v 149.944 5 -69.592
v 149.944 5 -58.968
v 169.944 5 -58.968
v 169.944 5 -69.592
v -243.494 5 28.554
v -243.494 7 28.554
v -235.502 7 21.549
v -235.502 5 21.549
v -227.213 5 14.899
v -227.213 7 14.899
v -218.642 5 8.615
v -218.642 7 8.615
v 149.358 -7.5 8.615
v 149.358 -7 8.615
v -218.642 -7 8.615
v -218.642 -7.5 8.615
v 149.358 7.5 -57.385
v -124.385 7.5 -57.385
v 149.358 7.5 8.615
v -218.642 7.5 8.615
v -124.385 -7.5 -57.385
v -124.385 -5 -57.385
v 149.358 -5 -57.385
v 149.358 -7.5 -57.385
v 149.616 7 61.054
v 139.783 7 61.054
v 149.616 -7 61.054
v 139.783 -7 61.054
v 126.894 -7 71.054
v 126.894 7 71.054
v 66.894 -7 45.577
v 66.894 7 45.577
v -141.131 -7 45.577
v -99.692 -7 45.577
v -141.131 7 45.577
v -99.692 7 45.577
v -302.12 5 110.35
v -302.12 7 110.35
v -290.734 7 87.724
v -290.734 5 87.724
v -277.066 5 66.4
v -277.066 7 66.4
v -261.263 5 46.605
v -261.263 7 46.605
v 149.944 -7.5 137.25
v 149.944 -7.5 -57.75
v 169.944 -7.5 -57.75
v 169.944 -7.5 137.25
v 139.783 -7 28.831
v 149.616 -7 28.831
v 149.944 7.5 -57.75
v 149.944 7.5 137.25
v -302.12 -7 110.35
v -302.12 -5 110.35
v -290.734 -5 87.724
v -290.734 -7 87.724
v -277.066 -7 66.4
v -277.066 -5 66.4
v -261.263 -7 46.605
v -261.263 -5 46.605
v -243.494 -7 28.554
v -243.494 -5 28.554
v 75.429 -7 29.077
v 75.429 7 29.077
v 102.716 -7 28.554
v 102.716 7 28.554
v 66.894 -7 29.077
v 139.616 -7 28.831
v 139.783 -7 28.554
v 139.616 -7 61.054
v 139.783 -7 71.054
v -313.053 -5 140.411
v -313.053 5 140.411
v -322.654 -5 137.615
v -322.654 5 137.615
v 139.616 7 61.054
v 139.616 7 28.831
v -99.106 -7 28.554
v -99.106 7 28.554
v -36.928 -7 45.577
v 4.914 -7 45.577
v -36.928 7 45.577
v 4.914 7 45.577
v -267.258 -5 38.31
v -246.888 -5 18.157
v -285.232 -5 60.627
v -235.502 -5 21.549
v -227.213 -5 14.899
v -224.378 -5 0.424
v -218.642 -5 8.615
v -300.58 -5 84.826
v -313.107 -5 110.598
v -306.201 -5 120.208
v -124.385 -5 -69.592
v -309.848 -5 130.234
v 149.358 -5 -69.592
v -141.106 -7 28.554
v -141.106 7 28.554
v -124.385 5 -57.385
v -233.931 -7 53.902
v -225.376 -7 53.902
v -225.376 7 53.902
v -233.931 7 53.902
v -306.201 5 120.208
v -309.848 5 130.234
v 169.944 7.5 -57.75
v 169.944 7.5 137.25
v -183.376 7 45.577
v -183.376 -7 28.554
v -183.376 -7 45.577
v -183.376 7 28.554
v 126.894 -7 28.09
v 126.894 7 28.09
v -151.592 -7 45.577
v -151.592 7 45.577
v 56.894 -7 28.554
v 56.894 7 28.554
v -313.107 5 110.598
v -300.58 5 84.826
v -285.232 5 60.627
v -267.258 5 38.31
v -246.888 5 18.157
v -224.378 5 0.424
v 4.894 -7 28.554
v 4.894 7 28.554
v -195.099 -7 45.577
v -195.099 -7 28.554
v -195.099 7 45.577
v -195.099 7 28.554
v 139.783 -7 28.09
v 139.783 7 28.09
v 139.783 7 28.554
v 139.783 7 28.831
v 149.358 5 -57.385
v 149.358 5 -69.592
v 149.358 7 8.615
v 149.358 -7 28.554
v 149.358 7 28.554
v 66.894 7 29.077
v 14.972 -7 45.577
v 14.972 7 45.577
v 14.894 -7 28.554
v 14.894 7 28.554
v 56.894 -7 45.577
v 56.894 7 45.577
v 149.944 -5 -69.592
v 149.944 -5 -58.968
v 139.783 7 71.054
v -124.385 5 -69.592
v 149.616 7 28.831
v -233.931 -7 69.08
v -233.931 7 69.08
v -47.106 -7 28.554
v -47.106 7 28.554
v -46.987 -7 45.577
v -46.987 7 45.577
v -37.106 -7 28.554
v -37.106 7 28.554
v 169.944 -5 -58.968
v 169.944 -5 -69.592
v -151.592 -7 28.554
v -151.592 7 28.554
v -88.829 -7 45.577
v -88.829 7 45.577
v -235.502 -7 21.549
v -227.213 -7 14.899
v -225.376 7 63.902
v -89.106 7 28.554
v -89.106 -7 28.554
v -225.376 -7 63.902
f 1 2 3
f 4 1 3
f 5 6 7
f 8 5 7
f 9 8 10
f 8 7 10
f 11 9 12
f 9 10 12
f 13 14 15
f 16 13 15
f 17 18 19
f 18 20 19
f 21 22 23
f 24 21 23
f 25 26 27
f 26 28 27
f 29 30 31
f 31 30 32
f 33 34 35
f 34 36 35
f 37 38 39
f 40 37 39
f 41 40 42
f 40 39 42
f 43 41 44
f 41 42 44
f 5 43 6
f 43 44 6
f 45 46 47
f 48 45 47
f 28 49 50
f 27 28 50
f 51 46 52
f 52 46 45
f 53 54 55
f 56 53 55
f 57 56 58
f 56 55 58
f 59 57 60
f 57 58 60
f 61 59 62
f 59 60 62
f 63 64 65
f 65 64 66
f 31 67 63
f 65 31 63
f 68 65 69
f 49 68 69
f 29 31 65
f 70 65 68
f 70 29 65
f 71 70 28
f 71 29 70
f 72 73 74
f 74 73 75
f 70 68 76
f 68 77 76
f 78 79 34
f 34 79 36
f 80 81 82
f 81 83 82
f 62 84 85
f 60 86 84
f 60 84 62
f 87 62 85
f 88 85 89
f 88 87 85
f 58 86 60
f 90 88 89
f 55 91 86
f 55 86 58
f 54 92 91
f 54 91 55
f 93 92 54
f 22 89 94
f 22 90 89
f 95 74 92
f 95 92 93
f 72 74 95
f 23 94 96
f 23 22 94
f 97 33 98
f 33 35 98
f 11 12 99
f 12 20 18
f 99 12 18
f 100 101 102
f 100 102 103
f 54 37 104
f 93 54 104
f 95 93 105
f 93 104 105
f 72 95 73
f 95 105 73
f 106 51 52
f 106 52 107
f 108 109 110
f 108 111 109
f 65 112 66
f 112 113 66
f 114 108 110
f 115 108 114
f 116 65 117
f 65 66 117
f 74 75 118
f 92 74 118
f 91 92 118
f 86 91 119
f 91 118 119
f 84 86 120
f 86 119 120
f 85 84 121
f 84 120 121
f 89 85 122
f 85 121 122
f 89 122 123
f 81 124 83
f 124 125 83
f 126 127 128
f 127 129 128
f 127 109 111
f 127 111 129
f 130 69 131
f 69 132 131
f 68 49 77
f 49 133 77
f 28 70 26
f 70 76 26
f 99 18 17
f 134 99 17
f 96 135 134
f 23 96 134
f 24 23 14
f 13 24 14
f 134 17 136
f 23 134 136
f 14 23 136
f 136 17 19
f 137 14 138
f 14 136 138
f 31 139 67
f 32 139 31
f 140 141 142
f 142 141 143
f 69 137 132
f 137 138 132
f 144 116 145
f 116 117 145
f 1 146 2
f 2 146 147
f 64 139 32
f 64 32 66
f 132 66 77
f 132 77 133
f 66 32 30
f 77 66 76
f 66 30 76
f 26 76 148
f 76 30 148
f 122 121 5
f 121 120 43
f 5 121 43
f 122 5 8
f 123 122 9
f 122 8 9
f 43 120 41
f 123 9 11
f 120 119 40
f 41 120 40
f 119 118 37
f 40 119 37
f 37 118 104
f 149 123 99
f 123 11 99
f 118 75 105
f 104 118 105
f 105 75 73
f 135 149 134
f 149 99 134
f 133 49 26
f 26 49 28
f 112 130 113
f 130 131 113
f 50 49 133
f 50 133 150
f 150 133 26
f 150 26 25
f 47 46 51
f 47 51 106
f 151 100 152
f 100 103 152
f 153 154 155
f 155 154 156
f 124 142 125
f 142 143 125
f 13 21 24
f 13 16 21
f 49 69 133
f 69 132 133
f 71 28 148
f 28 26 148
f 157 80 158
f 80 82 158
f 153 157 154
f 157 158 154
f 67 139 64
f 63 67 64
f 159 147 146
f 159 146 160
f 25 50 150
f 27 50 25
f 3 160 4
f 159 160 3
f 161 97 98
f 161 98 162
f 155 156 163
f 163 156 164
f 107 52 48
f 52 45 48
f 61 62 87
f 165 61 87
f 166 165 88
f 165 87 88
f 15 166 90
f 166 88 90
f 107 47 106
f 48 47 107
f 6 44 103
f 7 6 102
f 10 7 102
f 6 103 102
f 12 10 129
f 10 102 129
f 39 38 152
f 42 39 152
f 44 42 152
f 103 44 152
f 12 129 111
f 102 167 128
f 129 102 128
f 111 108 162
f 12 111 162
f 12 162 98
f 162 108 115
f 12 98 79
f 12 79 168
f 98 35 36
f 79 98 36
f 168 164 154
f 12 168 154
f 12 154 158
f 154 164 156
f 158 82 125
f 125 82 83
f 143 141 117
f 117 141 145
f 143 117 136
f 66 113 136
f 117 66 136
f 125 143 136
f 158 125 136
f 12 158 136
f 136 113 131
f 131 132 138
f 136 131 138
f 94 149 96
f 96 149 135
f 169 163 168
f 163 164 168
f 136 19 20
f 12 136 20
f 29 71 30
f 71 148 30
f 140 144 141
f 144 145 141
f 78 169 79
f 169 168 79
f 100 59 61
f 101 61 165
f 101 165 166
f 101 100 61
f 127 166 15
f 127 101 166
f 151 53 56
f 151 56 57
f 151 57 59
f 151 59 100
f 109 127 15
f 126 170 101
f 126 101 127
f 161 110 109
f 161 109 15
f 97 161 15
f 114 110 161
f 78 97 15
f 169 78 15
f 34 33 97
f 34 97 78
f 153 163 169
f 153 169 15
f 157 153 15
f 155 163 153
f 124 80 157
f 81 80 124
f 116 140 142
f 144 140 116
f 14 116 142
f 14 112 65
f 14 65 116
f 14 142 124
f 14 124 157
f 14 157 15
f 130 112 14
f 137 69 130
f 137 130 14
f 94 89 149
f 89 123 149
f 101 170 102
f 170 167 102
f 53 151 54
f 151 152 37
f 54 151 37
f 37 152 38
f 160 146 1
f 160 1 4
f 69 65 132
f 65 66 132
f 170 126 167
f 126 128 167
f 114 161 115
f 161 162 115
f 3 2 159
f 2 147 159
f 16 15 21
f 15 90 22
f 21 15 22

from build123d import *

# Parameters (mm, degrees)
F0_W     = 273.742232
F0_H     = 66
F0_W_2   = 20
F0_H_2   = 195
F1_DEPTH = 7.5
F0_H_3   = 12.207746
F0_H_4   = 10.624433
F2_DEPTH = 5
F0_W_3   = 31.783938
F0_H_5   = 17.023131
F0_W_4   = 8.53467
F0_H_6   = 16.5
F0_W_5   = 9.833415
F0_H_7   = 32.222636
F3_DEPTH = 7


with BuildPart() as f1:
    # F0 (on Front) → F1 (new body, symmetric)
    with BuildSketch(Plane.XZ):
        Polygon((-218.642425, 8.615474), (-124.384657, -57.384526), (-124.384657, 8.615474), align=None)
        with Locations((12.486459, -24.384526)):
            Rectangle(F0_W, F0_H)
        with Locations((159.944269, 39.750233)):
            Rectangle(F0_W_2, F0_H_2)
    extrude(amount=F1_DEPTH, both=True)

    # F0 (on Front) → F2 (join, symmetric)
    with BuildSketch(Plane.XZ):
        with BuildLine():
            ThreePointArc((-322.654305, 137.615474), (-285.231903, 60.627292), (-224.37819, 0.423954))
            Line((-224.37819, 0.423954), (-218.642425, 8.615474))
            ThreePointArc((-218.642425, 8.615474), (-231.39374, 18.17899), (-243.494087, 28.553885))
            ThreePointArc((-243.494087, 28.553885), (-277.065868, 66.399638), (-302.120114, 110.350181))
            ThreePointArc((-302.120114, 110.350181), (-308.07916, 125.201227), (-313.052892, 140.410626))
            Line((-313.052892, 140.410626), (-322.654305, 137.615474))
        make_face()
        Polygon((-224.37819, 0.423954), (-124.384657, -69.592272), (-124.384657, -57.384526), (-218.642425, 8.615474), align=None)
        with Locations((12.486459, -63.488399)):
            Rectangle(F0_W, F0_H_3)
        with Locations((159.944269, -64.280056)):
            Rectangle(F0_W_2, F0_H_4)
    extrude(amount=F2_DEPTH, both=True)

    # F0 (on Front) → F3 (join, symmetric)
    with BuildSketch(Plane.XZ):
        Polygon((-124.384657, 8.615474), (149.357575, 8.615474), (149.357575, 28.553885), (139.782995, 28.553885), (139.782995, 28.090366), (126.893967, 28.090366), (102.716003, 28.553885), (56.893967, 28.553885), (14.893967, 28.553885), (4.893967, 28.553885), (-37.106033, 28.553885), (-47.106033, 28.553885), (-89.106033, 28.553885), (-99.106033, 28.553885), (-141.106033, 28.553885), (-151.591912, 28.553885), (-183.37585, 28.553885), (-195.098877, 28.553885), (-218.642425, 28.553885), (-218.642425, 8.615474), align=None)
        with BuildLine():
            ThreePointArc((-243.494087, 28.553885), (-231.39374, 18.17899), (-218.642425, 8.615474))
            Line((-218.642425, 8.615474), (-218.642425, 28.553885))
            Line((-218.642425, 28.553885), (-243.494087, 28.553885))
        make_face()
        with BuildLine():
            ThreePointArc((-302.120114, 110.350181), (-277.065868, 66.399638), (-243.494087, 28.553885))
            Line((-243.494087, 28.553885), (-218.642425, 28.553885))
            Line((-218.642425, 28.553885), (-195.098877, 28.553885))
            Line((-195.098877, 28.553885), (-195.098877, 45.577016))
            Line((-195.098877, 45.577016), (-225.37585, 63.901747))
            Line((-225.37585, 63.901747), (-225.37585, 53.901747))
            Line((-225.37585, 53.901747), (-233.930952, 53.901747))
            Line((-233.930952, 53.901747), (-233.930952, 69.079607))
            Line((-233.930952, 69.079607), (-302.120114, 110.350181))
        make_face()
        with Locations((-167.483881, 37.06545)):
            Rectangle(F0_W_3, F0_H_5)
        Polygon((-141.131371, 45.577016), (-141.106033, 28.553885), (-99.106033, 28.553885), (-99.691547, 45.577016), align=None)
        Polygon((-88.828683, 45.577016), (-89.106033, 28.553885), (-47.106033, 28.553885), (-46.986528, 45.577016), align=None)
        Polygon((-37.106033, 28.553885), (4.893967, 28.553885), (4.913834, 45.577016), (-36.928322, 45.577016), align=None)
        Polygon((14.893967, 28.553885), (56.893967, 28.553885), (56.893967, 45.577016), (14.972052, 45.577016), align=None)
        Polygon((102.716003, 28.553885), (126.893967, 28.553885), (126.893967, 71.053885), (66.893967, 45.577016), (75.428637, 45.577016), (75.428637, 29.077016), align=None)
        with Locations((71.161302, 37.327016)):
            Rectangle(F0_W_4, F0_H_6)
        Polygon((126.893967, 28.553885), (139.782995, 28.553885), (139.782995, 28.831249), (139.61641, 28.831249), (139.61641, 61.053885), (139.782995, 61.053885), (139.782995, 71.053885), (126.893967, 71.053885), align=None)
        with Locations((144.699703, 44.942567)):
            Rectangle(F0_W_5, F0_H_7)
    extrude(amount=F3_DEPTH, both=True)


solid = f1.part
